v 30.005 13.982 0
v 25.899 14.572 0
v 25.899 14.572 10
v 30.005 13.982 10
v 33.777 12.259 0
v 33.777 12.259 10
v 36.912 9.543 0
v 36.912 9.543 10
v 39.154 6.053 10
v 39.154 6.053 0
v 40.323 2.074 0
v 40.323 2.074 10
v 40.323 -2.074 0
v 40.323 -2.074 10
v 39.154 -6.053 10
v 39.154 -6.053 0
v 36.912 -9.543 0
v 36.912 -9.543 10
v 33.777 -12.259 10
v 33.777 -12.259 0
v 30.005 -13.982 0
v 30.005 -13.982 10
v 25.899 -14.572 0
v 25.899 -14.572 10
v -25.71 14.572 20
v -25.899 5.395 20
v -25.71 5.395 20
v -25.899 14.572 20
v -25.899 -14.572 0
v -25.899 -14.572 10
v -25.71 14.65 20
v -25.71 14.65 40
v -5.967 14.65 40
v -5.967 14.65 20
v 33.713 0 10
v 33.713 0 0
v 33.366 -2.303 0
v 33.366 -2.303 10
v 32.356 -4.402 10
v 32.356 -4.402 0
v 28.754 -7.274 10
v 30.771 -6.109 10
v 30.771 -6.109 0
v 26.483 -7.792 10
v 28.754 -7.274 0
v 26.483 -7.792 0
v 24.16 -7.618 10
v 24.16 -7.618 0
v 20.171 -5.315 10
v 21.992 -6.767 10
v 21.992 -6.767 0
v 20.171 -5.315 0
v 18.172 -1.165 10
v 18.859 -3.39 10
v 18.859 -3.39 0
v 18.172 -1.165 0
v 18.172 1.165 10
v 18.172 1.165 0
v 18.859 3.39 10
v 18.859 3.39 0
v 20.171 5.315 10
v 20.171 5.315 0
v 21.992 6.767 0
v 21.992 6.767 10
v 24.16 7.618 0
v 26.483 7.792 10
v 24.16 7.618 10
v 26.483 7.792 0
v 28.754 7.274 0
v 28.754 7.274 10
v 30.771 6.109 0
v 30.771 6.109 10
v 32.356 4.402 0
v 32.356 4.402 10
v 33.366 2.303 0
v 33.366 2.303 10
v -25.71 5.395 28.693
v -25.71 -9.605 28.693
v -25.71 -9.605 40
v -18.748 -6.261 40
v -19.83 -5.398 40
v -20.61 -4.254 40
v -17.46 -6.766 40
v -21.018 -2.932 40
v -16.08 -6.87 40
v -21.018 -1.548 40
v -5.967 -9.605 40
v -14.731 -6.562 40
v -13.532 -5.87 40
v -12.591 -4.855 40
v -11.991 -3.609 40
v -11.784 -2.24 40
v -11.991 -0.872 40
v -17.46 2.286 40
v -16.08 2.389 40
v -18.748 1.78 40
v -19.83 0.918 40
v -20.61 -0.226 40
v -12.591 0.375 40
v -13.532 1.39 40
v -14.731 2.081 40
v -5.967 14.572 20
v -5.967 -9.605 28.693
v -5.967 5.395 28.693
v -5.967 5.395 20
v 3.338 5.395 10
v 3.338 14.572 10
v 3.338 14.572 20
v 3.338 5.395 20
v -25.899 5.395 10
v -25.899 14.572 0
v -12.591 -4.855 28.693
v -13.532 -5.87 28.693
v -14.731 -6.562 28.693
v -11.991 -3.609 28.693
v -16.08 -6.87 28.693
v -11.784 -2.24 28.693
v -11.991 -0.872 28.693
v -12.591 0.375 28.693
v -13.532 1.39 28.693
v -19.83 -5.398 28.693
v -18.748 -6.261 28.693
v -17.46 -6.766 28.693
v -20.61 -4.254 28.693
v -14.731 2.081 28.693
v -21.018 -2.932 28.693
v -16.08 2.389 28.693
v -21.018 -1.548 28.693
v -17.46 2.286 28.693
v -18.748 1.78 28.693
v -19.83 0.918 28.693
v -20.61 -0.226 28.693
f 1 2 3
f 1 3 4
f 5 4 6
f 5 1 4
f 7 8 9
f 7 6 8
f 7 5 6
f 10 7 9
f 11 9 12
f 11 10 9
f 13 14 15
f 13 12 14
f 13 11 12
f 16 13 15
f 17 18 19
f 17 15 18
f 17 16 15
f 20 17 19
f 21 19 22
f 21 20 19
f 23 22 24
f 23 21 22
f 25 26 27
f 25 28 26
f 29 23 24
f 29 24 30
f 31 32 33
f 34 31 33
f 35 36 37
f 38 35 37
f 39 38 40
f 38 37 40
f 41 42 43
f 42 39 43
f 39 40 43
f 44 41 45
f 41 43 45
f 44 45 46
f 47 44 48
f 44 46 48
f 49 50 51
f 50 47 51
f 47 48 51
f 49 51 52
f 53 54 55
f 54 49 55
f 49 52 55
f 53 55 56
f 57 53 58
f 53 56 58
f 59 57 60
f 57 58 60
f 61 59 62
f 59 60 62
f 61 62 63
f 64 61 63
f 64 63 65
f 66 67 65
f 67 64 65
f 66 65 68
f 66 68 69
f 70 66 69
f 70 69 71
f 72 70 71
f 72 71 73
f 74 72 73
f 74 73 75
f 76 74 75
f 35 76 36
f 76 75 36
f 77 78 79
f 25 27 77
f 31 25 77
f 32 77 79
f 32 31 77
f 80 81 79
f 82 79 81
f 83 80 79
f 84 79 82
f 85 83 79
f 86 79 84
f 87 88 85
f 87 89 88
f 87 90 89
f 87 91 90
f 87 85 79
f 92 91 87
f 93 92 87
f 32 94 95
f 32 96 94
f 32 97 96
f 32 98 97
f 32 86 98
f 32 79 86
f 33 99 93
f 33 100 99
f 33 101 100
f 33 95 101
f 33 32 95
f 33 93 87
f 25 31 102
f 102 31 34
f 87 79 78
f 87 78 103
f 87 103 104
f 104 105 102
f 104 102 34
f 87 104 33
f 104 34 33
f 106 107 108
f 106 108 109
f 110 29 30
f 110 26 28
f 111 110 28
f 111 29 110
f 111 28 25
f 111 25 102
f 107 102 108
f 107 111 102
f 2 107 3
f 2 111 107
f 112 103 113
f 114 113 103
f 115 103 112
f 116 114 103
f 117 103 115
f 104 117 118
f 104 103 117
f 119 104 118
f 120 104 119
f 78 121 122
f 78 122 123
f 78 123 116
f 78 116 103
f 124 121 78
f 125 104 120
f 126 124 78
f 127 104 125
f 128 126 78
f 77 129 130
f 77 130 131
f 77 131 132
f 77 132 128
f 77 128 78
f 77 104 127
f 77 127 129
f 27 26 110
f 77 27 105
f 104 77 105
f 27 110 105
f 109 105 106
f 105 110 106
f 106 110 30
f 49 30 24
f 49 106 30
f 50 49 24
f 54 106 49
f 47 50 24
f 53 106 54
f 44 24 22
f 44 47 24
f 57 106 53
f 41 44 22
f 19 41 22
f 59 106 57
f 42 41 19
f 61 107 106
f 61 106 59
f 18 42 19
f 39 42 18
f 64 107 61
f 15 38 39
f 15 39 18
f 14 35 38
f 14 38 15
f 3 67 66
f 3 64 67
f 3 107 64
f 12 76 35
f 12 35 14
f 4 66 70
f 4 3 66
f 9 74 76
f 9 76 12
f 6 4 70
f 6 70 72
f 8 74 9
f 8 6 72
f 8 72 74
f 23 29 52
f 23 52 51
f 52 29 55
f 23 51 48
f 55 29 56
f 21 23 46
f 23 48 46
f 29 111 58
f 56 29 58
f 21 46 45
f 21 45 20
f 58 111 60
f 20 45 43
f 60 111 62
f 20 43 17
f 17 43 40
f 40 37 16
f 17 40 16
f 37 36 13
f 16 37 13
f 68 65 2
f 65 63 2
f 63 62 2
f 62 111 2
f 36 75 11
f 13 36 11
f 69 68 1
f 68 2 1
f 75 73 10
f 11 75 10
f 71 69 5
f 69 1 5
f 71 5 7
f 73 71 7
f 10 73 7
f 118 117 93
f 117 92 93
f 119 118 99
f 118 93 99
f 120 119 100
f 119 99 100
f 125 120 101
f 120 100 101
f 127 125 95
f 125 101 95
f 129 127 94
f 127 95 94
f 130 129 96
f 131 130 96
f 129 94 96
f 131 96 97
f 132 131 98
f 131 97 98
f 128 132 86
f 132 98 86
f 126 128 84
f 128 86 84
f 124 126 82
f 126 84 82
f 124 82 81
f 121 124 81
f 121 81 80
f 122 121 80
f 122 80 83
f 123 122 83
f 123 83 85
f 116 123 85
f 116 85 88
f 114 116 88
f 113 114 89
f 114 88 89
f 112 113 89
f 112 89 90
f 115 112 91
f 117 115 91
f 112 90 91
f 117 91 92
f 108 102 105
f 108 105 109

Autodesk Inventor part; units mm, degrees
ref_plane "YZ Plane" through (0, 0, 0) normal (1, 0, 0) x (0, 1, 0)
ref_plane "XZ Plane" through (0, 0, 0) normal (0, 1, 0) x (-1, 0, 0)
ref_plane "XY Plane" through (0, 0, 0) normal (0, 0, 1) x (1, 0, 0)
sketch "스케치1" plane through (0, 0, 0) normal (0, 0, 1) x (1, 0, 0)
  line L0 (25.8992, -14.5721) -> (-25.8992, -14.5721)
  line L1 (-25.8992, -14.5721) -> (-25.8992, 14.5721)
  line L2 (-25.8992, 14.5721) -> (25.8992, 14.5721)
  line L3 (25.8992, -14.5721) -> (-25.8992, 14.5721) construction
  line L4 (-25.8992, -14.5721) -> (25.8992, 14.5721) construction
  arc A0 (25.8992, -14.5721) -> (25.8992, 14.5721) centre (25.8992, 0) ccw
  circle A1 centre (25.8992, 0) radius 7.8142
  point P0 (0, 0)
extrude "돌출1" add sketch "스케치1" along normal blind 10
sketch "스케치2" plane through (0, 0, 10) normal (0, 0, 1) x (1, 0, 0)
  line L0 (-25.8992, 14.5721) -> (-25.8992, -14.5721) projected
  line L1 (-25.8992, 14.5721) -> (3.3382, 14.5721)
  line L2 (3.3382, 14.5721) -> (3.3382, 5.3954)
  line L3 (3.3382, 5.3954) -> (-25.8992, 5.3954)
  line L4 (-25.8992, 5.3954) -> (-25.8992, 14.5721)
  point P0 (0, 0)
extrude "돌출2" add sketch "스케치2" along normal blind 10
sketch "스케치3" plane through (0, 0, 20) normal (0, 0, 1) x (1, 0, 0)
  line L0 (-25.8992, 5.3954) -> (3.3382, 5.3954) projected
  line L1 (-25.7105, 14.6501) -> (-5.9667, 14.6501)
  line L2 (-5.9667, 14.6501) -> (-5.9667, 5.3954)
  line L3 (-5.9667, 5.3954) -> (-25.7105, 5.3954)
  line L4 (-25.7105, 5.3954) -> (-25.7105, 14.6501)
  point P0 (0, 0)
extrude "돌출3" add sketch "스케치3" along normal blind 20
sketch "스케치4" plane through (-25.8992, 5.3954, 10) normal (0, -1, 0) x (1, 0, 0)
  line L0 (0.1887, 30) -> (19.9325, 30) projected
  line L1 (19.9325, 10) -> (19.9325, 30) projected
  line L2 (0.1887, 30) -> (19.9325, 30)
  line L3 (19.9325, 30) -> (19.9325, 18.6928)
  line L4 (19.9325, 18.6928) -> (0.1887, 18.6928)
  line L5 (0.1887, 18.6928) -> (0.1887, 30)
  point P0 (25.8992, -10)
extrude "돌출4" add sketch "스케치4" along normal blind 15
sketch "스케치5" plane through (0, 0, 40) normal (0, 0, 1) x (1, 0, 0)
  circle A0 centre (-16.4269, -2.2401) radius 4.6425
  point P0 (0, 0)
extrude "돌출5" cut sketch "스케치5" against normal blind 15
properties part number "240503_3Dsketch07"
